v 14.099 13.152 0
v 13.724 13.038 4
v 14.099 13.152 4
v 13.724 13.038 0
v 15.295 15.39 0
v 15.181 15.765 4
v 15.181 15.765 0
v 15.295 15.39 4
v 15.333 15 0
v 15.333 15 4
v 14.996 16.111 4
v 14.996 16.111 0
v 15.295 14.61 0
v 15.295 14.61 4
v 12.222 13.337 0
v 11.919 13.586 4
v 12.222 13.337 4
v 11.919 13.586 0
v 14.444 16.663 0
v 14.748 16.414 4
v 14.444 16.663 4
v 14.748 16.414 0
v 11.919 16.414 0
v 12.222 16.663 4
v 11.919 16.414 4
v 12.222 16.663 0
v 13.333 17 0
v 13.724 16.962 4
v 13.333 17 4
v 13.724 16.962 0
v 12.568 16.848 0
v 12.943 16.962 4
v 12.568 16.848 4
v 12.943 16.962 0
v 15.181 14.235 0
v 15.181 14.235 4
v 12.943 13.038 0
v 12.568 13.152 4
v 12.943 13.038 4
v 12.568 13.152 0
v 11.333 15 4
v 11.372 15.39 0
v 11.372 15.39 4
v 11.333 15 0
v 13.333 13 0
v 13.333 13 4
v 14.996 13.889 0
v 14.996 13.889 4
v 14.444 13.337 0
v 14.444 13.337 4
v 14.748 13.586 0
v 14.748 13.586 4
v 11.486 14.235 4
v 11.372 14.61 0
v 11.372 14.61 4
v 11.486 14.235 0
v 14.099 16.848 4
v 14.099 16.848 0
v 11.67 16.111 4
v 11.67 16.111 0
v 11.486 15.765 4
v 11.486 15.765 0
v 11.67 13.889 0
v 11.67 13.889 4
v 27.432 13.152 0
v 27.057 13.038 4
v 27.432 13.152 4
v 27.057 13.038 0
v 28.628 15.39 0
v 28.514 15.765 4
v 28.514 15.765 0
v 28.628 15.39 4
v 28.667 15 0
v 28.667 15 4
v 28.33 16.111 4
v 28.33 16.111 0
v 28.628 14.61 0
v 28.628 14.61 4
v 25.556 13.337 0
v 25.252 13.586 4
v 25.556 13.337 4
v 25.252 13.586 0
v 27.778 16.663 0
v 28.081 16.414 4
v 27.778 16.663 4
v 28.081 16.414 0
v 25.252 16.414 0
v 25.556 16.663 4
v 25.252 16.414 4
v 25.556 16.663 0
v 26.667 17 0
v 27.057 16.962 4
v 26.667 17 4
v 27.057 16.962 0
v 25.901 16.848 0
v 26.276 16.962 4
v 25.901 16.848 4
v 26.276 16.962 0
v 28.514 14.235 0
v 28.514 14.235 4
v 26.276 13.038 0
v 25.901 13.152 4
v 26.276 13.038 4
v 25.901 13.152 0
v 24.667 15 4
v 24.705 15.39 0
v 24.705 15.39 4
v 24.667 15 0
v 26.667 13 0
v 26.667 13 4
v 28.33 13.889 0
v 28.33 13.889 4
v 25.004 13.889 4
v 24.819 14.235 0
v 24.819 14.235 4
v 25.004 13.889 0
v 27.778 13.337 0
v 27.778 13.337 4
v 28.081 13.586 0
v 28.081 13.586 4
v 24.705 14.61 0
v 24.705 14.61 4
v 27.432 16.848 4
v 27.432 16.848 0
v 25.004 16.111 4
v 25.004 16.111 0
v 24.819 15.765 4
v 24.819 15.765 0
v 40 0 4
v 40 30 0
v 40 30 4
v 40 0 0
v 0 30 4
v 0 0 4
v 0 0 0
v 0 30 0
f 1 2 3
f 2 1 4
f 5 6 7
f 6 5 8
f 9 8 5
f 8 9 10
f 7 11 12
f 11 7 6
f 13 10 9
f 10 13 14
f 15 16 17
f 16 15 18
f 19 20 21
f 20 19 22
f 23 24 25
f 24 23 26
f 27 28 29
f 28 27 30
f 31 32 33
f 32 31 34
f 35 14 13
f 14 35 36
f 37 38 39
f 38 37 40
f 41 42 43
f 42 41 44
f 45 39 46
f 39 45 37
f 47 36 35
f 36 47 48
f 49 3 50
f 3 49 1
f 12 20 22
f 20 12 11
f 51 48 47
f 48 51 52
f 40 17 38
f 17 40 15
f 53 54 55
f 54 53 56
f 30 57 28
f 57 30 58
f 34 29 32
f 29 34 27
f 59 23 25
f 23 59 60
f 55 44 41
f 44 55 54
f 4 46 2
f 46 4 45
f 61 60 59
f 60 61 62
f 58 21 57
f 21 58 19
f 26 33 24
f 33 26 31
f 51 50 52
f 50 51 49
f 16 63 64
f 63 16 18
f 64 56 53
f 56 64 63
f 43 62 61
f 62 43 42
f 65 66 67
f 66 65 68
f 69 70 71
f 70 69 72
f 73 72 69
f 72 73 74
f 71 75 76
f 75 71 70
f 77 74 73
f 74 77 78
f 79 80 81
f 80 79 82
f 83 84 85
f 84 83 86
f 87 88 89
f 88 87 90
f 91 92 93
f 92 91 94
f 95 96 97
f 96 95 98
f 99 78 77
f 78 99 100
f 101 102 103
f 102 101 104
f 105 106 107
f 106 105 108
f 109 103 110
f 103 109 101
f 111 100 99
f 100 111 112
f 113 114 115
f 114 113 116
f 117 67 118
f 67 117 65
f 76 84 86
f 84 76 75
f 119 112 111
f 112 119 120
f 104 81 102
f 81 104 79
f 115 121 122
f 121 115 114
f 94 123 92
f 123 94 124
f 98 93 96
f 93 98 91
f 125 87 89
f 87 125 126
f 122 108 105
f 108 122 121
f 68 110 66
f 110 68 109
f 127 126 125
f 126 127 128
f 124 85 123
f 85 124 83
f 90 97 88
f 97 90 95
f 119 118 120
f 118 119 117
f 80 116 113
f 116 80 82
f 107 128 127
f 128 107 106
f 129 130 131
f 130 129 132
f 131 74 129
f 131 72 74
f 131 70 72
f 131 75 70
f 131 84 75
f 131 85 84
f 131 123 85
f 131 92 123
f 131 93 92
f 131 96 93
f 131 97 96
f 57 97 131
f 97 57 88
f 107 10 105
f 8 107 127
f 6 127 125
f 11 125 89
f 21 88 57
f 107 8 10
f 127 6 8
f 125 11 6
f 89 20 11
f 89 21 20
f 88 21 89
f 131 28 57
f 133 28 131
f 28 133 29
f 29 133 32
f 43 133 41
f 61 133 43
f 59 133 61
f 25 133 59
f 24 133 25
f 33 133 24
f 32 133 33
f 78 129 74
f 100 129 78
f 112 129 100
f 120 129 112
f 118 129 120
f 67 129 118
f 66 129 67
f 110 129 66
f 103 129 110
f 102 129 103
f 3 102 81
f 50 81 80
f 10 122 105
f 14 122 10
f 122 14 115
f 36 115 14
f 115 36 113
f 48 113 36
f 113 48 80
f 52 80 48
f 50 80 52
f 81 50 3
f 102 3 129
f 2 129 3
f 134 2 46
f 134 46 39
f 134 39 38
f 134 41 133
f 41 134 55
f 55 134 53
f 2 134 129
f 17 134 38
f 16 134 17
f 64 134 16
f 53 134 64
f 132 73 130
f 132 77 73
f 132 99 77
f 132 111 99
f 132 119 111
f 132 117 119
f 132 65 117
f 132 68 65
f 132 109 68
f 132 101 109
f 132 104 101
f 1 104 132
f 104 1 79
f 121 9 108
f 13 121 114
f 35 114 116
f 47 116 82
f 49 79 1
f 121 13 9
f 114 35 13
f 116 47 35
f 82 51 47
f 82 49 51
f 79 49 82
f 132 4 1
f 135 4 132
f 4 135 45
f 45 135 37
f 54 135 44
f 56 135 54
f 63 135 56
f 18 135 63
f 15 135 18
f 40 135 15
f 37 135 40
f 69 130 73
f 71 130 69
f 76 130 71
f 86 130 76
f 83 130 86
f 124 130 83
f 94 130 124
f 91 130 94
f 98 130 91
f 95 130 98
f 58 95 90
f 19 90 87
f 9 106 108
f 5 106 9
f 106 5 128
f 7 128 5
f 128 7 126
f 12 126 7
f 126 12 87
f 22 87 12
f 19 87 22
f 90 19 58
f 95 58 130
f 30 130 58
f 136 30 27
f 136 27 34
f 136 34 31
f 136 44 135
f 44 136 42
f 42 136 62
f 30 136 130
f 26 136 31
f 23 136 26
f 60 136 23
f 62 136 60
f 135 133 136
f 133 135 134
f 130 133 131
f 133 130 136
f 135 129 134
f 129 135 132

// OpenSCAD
// A plate with a row of holes (P5-04, ADR-0071): the Import dialog's
// fixture, whose customizer variables become the dialog's rows.

/* [Size] */
// Plate width
width = 40; // [10:100]
// Plate depth
depth = 30; // [10:100]

/* [Holes] */
// Number of holes
holes = 2; // [0:6]
// The holes' diameter
hole = 4; // [2:0.5:10]
label = "plate";
rounded = false;

/* [Hidden] */
thickness = 4;

difference() {
  cube([width, depth, thickness]);
  if (holes > 0)
    for (i = [1 : holes])
      translate([i * width / (holes + 1), depth / 2, -1])
        cylinder(d = hole, h = thickness + 2, $fn = 32);
}
